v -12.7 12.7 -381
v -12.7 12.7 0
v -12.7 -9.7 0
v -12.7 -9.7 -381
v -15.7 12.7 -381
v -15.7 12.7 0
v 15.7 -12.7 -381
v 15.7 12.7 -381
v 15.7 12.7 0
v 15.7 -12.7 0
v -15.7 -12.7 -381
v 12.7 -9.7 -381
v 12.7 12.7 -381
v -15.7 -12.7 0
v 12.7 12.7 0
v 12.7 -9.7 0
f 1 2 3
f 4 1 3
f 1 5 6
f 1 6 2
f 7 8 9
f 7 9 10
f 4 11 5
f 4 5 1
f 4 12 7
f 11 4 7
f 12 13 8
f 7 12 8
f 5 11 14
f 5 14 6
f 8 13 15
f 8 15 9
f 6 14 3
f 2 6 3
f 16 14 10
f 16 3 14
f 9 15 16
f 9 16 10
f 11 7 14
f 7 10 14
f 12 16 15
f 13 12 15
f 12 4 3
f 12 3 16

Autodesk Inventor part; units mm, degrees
ref_plane "YZ Plane" through (0, 0, 0) normal (1, 0, 0) x (0, 1, 0)
ref_plane "XZ Plane" through (0, 0, 0) normal (0, 1, 0) x (-1, 0, 0)
ref_plane "XY Plane" through (0, 0, 0) normal (0, 0, 1) x (1, 0, 0)
sketch "Sketch1" plane through (0, 0, 0) normal (0, 0, 1) x (1, 0, 0)
  line L0 (-15.7, 12.7) -> (-12.7, 12.7)
  line L1 (-12.7, 12.7) -> (-12.7, -9.7)
  line L2 (-12.7, -9.7) -> (12.7, -9.7)
  line L3 (12.7, -9.7) -> (12.7, 12.7)
  line L4 (12.7, 12.7) -> (15.7, 12.7)
  line L5 (15.7, 12.7) -> (15.7, -12.7)
  line L6 (15.7, -12.7) -> (-15.7, -12.7)
  line L7 (-15.7, -12.7) -> (-15.7, 12.7)
  point P0 (0, 0)
  dimension "d0" = 3
  dimension "d2" = 3
  dimension "d3" = 25.4
  dimension "d4" = 31.4
  dimension "d5" = 15.7
  dimension "d7" = 12.7
  dimension "d8" = 3
extrude "Extrusion1" add sketch "Sketch1" against normal blind 381
equation "\"d2\" = d0"
equation "\"d5\" = 0.5 * d4"
equation "\"d7\" = 0.5 * d3"
equation "\"d8\" = d0"
properties part number "15in c channel"
